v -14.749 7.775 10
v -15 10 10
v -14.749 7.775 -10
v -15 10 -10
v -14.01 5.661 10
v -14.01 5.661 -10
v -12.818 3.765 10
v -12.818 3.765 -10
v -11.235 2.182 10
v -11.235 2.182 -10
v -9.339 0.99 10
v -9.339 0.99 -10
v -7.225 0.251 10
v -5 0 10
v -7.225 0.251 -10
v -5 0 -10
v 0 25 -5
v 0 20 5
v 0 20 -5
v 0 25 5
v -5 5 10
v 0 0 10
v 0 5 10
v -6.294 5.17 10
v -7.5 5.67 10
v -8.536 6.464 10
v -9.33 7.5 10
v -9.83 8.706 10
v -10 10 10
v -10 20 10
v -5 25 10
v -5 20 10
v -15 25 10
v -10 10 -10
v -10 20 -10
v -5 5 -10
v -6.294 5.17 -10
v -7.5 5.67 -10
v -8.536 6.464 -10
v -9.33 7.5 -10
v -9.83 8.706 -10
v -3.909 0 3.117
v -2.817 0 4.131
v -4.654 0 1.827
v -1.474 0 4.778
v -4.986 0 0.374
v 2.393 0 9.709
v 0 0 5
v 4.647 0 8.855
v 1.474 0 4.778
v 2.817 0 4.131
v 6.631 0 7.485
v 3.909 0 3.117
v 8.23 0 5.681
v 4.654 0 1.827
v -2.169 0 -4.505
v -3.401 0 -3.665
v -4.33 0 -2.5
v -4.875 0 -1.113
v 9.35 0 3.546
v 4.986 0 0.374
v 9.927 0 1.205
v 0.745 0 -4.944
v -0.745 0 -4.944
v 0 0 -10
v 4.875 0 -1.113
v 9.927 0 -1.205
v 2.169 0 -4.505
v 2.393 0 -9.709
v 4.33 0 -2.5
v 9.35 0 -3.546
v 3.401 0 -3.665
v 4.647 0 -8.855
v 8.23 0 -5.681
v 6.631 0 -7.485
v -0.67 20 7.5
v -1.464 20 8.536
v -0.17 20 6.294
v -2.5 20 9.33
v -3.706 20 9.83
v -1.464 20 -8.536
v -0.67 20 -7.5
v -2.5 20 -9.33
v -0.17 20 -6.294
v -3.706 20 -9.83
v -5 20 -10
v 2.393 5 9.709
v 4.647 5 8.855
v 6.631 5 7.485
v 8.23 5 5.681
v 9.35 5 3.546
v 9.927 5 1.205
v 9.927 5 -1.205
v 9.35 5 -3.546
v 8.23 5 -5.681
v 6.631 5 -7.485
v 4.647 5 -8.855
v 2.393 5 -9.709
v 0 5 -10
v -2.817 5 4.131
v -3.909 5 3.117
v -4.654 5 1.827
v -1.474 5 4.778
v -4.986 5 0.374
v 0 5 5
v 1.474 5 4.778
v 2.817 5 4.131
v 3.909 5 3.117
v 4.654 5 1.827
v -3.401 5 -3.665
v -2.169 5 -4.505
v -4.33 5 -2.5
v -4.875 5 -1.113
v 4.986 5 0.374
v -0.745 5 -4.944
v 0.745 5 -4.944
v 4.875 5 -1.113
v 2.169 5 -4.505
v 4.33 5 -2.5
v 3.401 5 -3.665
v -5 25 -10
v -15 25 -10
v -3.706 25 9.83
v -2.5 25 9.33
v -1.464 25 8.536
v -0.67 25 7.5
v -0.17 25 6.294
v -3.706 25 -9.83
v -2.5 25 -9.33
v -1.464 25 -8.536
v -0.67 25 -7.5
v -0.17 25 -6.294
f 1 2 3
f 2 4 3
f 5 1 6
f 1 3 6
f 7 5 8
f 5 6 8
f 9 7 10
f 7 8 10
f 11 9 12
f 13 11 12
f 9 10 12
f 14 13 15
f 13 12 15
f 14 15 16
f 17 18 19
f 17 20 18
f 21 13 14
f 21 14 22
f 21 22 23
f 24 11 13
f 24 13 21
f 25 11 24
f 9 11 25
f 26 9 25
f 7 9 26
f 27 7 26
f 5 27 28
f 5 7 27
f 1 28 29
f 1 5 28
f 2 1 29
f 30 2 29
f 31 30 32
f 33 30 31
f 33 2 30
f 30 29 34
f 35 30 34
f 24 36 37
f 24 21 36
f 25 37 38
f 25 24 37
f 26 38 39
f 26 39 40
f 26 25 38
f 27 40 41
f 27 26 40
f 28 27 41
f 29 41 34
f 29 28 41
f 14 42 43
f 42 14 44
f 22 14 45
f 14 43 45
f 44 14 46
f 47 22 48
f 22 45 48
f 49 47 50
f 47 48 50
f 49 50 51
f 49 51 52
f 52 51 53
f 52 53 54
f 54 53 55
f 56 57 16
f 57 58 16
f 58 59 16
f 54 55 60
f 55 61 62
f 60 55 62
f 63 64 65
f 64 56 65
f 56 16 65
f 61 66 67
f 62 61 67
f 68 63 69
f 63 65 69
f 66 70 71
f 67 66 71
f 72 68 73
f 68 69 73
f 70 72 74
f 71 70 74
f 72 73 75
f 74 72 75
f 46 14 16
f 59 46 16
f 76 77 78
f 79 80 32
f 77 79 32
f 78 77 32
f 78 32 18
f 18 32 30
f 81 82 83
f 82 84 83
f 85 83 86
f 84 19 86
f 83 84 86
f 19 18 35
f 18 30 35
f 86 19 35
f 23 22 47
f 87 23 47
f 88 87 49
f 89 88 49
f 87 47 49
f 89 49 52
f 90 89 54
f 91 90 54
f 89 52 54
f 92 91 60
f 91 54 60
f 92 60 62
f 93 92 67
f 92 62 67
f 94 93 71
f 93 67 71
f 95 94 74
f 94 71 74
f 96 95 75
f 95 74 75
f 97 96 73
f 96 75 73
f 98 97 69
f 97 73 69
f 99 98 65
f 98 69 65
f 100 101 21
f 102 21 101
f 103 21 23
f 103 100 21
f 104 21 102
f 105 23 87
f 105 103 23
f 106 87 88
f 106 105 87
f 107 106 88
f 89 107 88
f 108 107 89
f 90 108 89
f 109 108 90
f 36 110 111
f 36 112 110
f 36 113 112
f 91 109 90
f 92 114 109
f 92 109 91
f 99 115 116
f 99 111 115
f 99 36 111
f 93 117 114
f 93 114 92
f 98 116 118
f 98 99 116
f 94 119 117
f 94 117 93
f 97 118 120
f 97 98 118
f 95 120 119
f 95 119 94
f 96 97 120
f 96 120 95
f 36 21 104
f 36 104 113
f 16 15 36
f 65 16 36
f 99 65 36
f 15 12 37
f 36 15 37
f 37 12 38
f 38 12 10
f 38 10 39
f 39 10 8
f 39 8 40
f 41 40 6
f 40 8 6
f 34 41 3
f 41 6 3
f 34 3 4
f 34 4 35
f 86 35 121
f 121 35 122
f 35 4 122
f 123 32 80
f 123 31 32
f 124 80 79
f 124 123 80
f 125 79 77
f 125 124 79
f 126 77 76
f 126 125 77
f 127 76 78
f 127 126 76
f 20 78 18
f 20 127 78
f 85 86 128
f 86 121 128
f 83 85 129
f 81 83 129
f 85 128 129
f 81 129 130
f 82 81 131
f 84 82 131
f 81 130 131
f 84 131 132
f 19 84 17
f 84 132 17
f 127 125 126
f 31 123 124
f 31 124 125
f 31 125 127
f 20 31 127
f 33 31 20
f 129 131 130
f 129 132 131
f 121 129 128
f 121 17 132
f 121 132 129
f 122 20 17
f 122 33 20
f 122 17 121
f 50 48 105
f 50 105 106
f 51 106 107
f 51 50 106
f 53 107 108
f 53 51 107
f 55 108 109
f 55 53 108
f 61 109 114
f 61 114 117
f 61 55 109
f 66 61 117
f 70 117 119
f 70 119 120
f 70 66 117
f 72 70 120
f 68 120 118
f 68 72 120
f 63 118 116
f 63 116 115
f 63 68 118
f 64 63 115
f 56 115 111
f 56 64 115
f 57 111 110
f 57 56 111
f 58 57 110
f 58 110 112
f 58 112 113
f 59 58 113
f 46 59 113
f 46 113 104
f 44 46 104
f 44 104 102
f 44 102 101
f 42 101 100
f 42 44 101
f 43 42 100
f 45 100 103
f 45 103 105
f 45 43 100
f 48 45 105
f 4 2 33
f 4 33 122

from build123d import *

# Parameters (mm, degrees)
SKETCH_1_R      = 5
EXTRUDE_1_DEPTH = 5
SKETCH_1_3_W    = 5
SKETCH_1_3_H    = 20
EXTRUDE_2_DEPTH = 25
SKETCH_2_W      = 20
SKETCH_2_H      = 5
EXTRUDE_3_DEPTH = 10
FILLET_1_R      = 5
FILLET_2_R      = 10
FILLET_3_R      = 5


with BuildPart() as part:
    # 草圖1 → 填料-伸長1 (new body)
    with BuildSketch(Plane(origin=(0, 0, 0), x_dir=(1, 0, 0), z_dir=(0, 1, 0))):
        with BuildLine():
            ThreePointArc((0, -10), (10, 0), (0, 10))
            Line((0, 10), (-10, 10))
            Line((-10, 10), (-10, -10))
            Line((-10, -10), (0, -10))
        make_face()
        with Locations(Location((0, 0, 0), (0, 0, 270))):
            Circle(SKETCH_1_R, mode=Mode.SUBTRACT)
    extrude(amount=EXTRUDE_1_DEPTH)

    # 草圖1<3> → 填料-伸長2 (add)
    with BuildSketch(Plane(origin=(0, 0, 0), x_dir=(1, 0, 0), z_dir=(0, 1, 0))):
        with Locations((-12.5, 0)):
            Rectangle(SKETCH_1_3_W, SKETCH_1_3_H)
    extrude(amount=EXTRUDE_2_DEPTH)

    # 草圖2 → 填料-伸長3 (add)
    with BuildSketch(Plane(origin=(-10, 0, 0), x_dir=(0, 0, -1), z_dir=(1, 0, 0))):
        with Locations((0, 22.5)):
            Rectangle(SKETCH_2_W, SKETCH_2_H)
    extrude(amount=EXTRUDE_3_DEPTH)

    # 圓角1
    fillet_1_edges = [part.edges().sort_by_distance(p)[0] for p in [
        (0, 22.5, 10),
        (0, 22.5, -10),
    ]]
    fillet(fillet_1_edges, radius=FILLET_1_R)

    # 圓角2
    fillet_2_edges = [part.edges().sort_by_distance(p)[0] for p in [
        (-15, 0, 0),
    ]]
    fillet(fillet_2_edges, radius=FILLET_2_R)

    # 圓角3
    fillet_3_edges = [part.edges().sort_by_distance(p)[0] for p in [
        (-10, 5, 0),
    ]]
    fillet(fillet_3_edges, radius=FILLET_3_R)


solid = part.part
